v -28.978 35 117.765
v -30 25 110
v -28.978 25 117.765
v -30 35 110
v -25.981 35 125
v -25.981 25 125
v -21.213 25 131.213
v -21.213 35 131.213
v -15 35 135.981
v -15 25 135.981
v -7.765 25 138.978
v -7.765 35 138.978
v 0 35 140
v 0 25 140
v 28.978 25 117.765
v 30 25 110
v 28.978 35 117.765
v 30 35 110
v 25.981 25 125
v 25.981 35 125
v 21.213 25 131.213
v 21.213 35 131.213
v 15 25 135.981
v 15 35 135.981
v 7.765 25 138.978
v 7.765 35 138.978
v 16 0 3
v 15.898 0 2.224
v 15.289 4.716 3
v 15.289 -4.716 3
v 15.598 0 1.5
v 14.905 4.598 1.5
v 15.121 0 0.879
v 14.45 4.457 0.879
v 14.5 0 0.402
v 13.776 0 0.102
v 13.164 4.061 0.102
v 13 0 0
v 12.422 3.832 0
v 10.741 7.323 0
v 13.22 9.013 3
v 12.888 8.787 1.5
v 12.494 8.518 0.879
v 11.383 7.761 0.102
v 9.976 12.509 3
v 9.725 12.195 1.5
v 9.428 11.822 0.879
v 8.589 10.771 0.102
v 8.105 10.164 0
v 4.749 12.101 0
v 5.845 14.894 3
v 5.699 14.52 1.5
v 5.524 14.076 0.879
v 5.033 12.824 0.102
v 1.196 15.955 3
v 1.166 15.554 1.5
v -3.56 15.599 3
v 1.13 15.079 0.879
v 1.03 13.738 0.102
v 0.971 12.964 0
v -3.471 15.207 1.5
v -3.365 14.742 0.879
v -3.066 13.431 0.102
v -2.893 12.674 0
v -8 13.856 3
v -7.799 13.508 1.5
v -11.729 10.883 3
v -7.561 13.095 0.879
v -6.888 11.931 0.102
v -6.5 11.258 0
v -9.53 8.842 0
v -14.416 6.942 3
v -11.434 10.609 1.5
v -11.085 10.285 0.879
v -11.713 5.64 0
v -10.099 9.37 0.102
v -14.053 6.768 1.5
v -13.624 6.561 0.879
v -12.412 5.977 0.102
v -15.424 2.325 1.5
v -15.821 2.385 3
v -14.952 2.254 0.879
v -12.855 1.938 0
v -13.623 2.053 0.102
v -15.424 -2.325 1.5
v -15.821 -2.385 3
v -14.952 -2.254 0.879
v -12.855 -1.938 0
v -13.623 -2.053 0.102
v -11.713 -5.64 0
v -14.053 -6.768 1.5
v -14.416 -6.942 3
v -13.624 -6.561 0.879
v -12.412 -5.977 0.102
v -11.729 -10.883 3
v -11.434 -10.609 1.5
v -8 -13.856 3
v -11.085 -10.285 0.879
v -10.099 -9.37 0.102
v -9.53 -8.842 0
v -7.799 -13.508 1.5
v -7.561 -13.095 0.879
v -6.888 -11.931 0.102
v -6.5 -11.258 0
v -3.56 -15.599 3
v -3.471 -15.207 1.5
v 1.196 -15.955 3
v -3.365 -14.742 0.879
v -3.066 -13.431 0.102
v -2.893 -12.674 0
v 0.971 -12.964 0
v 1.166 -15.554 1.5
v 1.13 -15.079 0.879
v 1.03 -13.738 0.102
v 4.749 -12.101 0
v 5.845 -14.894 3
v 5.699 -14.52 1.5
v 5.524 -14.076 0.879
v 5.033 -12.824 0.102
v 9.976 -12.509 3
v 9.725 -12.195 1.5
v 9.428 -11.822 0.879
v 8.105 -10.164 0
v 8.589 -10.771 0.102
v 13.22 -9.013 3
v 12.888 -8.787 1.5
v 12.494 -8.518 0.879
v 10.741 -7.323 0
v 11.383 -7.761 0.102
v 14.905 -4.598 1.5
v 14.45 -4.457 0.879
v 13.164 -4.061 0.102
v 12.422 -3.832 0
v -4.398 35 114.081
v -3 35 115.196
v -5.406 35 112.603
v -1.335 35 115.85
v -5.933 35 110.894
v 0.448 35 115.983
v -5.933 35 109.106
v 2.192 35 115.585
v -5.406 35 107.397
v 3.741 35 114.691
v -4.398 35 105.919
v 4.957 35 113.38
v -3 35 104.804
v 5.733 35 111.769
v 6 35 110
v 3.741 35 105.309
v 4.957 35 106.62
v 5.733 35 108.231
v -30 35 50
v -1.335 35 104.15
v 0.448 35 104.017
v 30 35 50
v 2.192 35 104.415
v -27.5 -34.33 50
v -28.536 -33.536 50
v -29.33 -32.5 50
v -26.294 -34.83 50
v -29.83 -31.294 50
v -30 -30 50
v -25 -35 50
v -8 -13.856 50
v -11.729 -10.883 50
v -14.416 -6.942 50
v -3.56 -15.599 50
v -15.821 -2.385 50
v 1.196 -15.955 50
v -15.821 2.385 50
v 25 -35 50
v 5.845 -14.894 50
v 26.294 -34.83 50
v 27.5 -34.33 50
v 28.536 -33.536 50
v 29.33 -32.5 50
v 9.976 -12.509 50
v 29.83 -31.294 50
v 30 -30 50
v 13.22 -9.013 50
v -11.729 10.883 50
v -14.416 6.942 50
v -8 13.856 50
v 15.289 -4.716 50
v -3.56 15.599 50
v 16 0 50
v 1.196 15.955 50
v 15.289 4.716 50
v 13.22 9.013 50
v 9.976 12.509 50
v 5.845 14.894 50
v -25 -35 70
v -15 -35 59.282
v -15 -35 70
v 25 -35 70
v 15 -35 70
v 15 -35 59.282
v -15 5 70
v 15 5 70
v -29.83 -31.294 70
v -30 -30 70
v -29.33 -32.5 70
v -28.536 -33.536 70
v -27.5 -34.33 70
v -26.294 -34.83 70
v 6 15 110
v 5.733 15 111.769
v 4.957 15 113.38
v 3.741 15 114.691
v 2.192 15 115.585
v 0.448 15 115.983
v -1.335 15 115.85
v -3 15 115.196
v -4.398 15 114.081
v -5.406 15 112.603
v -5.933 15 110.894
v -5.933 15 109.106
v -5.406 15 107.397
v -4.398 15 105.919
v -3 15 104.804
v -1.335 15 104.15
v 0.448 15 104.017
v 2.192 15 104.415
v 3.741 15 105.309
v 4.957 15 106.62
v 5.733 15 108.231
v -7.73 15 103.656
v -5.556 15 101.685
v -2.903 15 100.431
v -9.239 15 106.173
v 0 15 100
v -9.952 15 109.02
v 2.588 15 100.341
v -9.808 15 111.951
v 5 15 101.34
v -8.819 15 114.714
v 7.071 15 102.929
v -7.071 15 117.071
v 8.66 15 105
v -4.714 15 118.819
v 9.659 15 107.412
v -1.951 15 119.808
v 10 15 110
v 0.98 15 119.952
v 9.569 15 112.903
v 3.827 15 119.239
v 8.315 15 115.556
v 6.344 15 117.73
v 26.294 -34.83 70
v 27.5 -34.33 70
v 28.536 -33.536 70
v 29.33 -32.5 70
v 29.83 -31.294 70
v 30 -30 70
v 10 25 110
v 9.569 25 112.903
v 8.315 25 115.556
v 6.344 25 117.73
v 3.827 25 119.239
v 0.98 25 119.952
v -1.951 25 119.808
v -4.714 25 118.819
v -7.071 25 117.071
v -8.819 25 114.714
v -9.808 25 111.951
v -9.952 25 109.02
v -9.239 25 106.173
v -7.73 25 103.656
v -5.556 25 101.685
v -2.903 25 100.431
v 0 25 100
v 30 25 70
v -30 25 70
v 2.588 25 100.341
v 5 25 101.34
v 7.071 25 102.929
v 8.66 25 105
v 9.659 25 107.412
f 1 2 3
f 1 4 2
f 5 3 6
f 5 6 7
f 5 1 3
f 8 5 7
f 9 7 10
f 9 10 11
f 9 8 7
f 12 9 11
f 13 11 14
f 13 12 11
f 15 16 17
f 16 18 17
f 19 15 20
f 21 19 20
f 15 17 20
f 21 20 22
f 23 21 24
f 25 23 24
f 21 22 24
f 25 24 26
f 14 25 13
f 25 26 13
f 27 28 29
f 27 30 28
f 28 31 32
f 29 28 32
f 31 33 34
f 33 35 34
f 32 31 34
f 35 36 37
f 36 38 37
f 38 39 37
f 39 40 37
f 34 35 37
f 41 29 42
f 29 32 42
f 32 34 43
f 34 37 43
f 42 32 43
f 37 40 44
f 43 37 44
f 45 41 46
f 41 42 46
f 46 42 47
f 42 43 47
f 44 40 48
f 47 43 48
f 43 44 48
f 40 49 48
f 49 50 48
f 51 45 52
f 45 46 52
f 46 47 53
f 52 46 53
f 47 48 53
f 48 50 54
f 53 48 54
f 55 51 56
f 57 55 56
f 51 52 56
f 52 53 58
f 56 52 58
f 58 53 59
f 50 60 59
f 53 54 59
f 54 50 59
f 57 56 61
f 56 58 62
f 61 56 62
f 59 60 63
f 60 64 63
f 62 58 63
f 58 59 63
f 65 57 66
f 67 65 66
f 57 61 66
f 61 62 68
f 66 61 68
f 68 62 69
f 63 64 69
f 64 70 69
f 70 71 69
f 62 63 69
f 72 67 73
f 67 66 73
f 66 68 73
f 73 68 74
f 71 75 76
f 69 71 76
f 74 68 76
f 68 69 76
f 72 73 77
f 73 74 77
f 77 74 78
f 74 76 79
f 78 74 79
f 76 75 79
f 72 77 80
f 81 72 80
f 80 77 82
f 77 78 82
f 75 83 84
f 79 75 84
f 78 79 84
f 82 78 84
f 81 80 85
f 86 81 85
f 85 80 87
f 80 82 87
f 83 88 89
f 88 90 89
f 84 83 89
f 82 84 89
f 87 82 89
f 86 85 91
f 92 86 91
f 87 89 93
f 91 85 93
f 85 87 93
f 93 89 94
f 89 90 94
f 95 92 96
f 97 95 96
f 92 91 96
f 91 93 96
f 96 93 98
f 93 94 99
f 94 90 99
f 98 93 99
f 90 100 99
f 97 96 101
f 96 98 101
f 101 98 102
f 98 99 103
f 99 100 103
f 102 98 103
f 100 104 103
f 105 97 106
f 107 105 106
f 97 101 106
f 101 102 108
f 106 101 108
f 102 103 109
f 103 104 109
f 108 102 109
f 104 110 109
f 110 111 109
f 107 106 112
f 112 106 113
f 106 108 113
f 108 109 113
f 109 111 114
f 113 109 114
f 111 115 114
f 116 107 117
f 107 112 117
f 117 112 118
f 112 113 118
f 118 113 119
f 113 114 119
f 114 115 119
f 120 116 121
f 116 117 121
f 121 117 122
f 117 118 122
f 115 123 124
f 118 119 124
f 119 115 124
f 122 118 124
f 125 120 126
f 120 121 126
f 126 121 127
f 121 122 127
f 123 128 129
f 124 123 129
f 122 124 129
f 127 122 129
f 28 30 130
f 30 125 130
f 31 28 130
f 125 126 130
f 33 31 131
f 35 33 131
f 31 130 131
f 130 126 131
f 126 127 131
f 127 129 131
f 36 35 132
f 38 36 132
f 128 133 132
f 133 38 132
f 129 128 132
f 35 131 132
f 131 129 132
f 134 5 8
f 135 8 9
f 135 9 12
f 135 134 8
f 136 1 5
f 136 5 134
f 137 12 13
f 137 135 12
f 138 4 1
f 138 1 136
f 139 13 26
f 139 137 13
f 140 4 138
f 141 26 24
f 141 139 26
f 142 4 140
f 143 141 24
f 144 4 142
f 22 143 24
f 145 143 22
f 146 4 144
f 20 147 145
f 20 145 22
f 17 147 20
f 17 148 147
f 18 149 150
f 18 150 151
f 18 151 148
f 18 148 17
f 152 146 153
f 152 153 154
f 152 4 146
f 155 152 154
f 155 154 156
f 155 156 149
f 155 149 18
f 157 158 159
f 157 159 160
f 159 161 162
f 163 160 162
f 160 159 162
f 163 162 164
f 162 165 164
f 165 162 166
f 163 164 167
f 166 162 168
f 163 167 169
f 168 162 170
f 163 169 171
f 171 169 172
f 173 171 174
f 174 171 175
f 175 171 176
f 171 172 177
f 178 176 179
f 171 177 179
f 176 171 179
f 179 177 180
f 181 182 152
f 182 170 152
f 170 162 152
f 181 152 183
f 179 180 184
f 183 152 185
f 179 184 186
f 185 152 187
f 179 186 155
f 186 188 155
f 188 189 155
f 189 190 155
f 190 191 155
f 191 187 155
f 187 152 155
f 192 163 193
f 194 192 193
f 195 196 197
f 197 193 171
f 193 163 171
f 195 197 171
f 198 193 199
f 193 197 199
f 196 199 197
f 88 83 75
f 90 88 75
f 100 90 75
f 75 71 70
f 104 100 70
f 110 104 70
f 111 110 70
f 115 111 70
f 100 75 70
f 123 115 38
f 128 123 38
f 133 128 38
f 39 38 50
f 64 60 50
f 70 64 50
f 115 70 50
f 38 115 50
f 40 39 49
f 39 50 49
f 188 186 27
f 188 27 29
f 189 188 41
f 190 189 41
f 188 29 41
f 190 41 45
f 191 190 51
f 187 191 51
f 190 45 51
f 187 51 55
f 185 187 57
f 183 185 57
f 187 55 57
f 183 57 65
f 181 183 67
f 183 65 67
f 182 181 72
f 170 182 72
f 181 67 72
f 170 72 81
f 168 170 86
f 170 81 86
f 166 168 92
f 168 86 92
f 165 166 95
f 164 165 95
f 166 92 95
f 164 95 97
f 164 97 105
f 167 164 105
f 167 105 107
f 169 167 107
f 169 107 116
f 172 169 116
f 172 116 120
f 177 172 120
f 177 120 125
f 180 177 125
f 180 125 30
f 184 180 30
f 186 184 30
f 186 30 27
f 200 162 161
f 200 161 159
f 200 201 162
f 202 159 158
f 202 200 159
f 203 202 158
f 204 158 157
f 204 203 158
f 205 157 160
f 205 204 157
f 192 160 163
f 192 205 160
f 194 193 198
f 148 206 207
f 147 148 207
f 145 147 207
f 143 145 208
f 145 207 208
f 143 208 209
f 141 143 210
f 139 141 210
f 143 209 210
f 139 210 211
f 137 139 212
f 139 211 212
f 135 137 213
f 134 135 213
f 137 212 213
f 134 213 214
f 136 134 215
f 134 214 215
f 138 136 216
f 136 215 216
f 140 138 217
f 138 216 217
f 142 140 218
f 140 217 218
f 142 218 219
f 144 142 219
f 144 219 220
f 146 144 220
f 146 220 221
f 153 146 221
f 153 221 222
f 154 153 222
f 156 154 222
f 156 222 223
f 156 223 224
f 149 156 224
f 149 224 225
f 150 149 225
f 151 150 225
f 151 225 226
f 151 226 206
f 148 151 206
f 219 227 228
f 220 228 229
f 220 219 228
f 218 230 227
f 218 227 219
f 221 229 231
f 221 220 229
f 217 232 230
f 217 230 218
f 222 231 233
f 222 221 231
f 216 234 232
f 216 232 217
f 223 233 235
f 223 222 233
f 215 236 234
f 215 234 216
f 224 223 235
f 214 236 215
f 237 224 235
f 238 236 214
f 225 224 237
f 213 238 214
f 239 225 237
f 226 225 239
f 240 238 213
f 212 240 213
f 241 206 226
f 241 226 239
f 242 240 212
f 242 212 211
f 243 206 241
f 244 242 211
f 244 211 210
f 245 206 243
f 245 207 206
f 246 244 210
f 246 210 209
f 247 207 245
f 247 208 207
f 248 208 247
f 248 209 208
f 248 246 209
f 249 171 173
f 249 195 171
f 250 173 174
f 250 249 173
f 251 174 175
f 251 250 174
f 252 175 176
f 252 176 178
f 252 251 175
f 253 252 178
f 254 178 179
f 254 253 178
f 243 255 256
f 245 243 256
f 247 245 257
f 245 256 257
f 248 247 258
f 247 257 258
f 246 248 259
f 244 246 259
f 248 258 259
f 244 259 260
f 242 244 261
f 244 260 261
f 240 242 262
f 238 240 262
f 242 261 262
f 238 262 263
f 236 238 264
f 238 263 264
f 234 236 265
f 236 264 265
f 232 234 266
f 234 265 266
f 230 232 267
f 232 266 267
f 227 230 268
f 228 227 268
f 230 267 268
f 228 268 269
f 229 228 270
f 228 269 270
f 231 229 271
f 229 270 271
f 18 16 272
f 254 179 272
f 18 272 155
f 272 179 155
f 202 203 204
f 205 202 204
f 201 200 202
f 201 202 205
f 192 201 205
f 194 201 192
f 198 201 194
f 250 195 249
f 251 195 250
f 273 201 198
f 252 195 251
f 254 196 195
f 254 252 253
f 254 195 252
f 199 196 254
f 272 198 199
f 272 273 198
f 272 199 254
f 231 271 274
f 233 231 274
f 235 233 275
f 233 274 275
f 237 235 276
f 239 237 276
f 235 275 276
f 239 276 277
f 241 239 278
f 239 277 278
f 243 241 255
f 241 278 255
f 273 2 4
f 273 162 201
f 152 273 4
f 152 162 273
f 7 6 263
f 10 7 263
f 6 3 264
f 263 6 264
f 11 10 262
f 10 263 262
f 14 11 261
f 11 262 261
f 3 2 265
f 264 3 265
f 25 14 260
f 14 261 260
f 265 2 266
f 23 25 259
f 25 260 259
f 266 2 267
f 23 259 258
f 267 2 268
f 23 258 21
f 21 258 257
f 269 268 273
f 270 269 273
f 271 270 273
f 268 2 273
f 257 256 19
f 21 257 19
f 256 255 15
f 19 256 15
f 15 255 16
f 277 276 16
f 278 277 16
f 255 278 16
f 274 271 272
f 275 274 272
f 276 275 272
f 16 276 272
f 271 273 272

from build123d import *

# Parameters (mm, degrees)
F0_R      = 16
F1_DEPTH  = 50
F4_R      = 3
F5_W      = 30
F5_H      = 40
F6_DEPTH  = 20
F8_DEPTH  = 15
F9_DEPTH  = 20
F11_W     = 60
F11_H     = 10
F12_DEPTH = 70
F13_R     = 29.99999
F16_DEPTH = 10
F18_R     = 6
F19_DEPTH = 50
F20_R     = 5


# Not quite as in the source:
# - a fillet or chamfer is up to 0.001 mm smaller than in the source, because OpenCascade refuses the exact size


with BuildPart() as f1:
    # F0 (on Top) → F1 (new body)
    with BuildSketch(Plane.XY):
        Circle(F0_R)
    extrude(amount=F1_DEPTH)

    # F4
    f4_edges = [f1.edges().sort_by_distance(p)[0] for p in [
        (-16, 0, 0),
    ]]
    fillet(f4_edges, radius=F4_R)

    # F5 (on offset) → F6 (join)
    with BuildSketch(Plane.XY.offset(50)):
        with Locations((0, -15)):
            Rectangle(F5_W, F5_H)
    extrude(amount=F6_DEPTH)

    # F7 (on Right) → F8 (cut, symmetric)
    with BuildSketch(Plane.YZ):
        Polygon((5, 70), (0, 70), (-35, 70), (-35, 59.2820323028), align=None)
    extrude(amount=F8_DEPTH, both=True, mode=Mode.SUBTRACT)

    # F3 (on offset) → F9 (join)
    with BuildSketch(Plane.XY.offset(50)):
        Polygon((30, 35), (-30, 35), (-30, -35), (-15, -35), (-15, 5), (15, 5), (15, -35), (30, -35), align=None)
    extrude(amount=F9_DEPTH)

    # F11 (on offset) → F12 (join)
    with BuildSketch(Plane.XY.offset(70)):
        with Locations((0, 30)):
            Rectangle(F11_W, F11_H)
    extrude(amount=F12_DEPTH)

    # F13 (radius 30 in the source; OpenCascade refuses exactly that, so slightly less here)
    f13_edges = [f1.edges().sort_by_distance(p)[0] for p in [
        (-30, 30, 140),
        (30, 30, 140),
    ]]
    fillet(f13_edges, radius=F13_R)

    # F15 (on offset) → F16 (join)
    with BuildSketch(Plane.XZ.offset(-25)):
        with BuildLine():
            ThreePointArc((0, 100), (7.0710678119, 102.9289321881), (10, 110))
            ThreePointArc((10, 110), (-7.0710678119, 117.0710678119), (0, 100))
        make_face()
    extrude(amount=F16_DEPTH)

    # F18 (on offset) → F19 (cut)
    with BuildSketch(Plane.XZ.offset(-15)):
        with Locations((0, 110)):
            Circle(F18_R)
    extrude(amount=-F19_DEPTH, mode=Mode.SUBTRACT)

    # F20
    f20_edges = [f1.edges().sort_by_distance(p)[0] for p in [
        (-30, -35, 60),
        (30, -35, 60),
    ]]
    fillet(f20_edges, radius=F20_R)


solid = f1.part
